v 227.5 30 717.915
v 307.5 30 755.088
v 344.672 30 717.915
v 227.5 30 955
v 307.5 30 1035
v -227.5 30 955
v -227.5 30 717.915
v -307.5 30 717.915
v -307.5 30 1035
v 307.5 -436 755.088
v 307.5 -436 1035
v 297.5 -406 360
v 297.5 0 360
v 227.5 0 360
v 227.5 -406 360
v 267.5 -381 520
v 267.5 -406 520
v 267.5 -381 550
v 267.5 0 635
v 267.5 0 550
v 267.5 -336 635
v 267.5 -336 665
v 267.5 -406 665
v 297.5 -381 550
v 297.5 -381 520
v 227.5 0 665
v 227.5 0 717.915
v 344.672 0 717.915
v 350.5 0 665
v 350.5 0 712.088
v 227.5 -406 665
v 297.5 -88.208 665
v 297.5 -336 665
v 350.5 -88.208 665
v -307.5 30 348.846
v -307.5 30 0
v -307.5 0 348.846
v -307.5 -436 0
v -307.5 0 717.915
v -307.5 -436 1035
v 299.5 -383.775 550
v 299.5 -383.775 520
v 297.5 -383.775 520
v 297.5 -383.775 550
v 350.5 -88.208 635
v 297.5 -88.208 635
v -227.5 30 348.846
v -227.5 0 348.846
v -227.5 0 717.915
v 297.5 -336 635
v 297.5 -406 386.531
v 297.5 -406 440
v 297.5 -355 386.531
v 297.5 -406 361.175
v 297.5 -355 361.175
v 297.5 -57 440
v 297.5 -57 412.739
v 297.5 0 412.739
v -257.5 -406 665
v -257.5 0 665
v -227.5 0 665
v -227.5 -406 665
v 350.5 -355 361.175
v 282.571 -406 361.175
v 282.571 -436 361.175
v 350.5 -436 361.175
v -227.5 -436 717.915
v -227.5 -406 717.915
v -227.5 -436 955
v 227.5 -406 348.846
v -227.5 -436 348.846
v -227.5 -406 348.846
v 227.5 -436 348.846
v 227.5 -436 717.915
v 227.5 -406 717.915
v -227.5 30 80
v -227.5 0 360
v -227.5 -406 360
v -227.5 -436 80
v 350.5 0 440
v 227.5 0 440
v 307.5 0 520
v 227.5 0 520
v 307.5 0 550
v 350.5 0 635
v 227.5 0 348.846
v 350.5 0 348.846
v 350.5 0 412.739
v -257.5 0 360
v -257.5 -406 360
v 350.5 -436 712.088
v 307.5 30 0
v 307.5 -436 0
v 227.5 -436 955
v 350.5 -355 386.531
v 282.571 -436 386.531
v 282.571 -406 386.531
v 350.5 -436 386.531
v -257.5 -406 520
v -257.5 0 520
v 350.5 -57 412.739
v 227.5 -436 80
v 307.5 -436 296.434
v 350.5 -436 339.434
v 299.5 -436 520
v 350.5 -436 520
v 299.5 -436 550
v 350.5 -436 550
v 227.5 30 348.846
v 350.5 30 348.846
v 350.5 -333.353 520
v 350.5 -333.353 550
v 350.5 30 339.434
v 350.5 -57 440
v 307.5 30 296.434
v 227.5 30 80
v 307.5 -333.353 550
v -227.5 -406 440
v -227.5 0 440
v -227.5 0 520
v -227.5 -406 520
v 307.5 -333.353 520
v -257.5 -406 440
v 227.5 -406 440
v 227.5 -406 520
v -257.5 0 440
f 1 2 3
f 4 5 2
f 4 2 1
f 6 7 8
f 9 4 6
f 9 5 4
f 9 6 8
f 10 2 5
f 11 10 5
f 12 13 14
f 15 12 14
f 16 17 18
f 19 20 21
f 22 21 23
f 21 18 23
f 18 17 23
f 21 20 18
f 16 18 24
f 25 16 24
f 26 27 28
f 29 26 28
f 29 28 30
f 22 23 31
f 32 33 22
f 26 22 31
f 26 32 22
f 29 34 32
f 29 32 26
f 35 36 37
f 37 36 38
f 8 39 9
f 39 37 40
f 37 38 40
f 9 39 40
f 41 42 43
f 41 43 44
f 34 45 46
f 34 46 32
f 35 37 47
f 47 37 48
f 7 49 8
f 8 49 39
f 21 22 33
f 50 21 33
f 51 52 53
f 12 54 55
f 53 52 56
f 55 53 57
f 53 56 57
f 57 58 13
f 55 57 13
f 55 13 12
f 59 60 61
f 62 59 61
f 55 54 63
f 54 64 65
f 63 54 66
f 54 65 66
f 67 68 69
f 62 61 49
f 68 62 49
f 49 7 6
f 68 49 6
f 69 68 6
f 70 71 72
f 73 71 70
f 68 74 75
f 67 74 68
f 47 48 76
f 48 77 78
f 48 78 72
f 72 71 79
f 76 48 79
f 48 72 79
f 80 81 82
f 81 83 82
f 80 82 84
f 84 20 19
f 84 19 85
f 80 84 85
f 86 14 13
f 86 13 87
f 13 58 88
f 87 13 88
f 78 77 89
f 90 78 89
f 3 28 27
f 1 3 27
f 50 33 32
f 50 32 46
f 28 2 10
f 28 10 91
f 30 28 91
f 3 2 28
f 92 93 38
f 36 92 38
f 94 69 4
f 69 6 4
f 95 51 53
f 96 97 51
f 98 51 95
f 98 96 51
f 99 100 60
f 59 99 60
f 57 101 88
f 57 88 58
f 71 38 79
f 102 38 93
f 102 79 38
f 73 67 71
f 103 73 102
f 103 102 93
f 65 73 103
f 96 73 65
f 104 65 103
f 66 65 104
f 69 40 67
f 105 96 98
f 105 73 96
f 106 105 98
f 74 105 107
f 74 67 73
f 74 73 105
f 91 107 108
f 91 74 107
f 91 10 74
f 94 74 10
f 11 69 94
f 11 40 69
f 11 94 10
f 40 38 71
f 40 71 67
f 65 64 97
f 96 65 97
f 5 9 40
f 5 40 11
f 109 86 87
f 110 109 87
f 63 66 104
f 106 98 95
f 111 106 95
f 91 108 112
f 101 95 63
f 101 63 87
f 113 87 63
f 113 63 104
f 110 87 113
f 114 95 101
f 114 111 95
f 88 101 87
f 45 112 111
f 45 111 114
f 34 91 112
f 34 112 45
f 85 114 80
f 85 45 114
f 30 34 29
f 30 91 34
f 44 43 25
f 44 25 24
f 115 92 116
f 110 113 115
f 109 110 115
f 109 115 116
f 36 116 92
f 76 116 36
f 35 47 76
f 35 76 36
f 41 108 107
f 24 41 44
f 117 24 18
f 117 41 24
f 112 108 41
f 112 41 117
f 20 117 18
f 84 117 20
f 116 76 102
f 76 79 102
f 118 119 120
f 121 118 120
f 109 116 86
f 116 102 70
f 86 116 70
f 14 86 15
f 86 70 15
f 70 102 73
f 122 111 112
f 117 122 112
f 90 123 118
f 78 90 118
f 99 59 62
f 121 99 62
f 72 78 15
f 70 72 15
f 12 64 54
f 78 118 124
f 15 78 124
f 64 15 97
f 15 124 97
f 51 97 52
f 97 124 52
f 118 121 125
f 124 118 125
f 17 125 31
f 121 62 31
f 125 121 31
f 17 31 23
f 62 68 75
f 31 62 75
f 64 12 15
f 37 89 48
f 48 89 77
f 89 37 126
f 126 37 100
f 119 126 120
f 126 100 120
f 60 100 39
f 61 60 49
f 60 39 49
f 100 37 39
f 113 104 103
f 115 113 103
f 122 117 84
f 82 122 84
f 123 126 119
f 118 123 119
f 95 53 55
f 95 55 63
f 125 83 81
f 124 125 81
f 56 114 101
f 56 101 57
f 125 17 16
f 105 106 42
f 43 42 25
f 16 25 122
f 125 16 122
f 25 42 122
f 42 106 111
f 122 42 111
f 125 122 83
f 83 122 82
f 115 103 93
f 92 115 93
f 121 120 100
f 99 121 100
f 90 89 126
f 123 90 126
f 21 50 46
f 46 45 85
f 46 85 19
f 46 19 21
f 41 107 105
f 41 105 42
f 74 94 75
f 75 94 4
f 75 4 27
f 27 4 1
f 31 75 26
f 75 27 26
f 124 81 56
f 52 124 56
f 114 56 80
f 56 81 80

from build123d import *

# Parameters (mm, degrees)
F0_W        = 615
F0_H        = 1035
F1_DEPTH    = 436
F2_W        = 383.7750256062
F2_H        = 30
F2_W_2      = 88.2078781724
F3_DEPTH    = 10
F4_W        = 436
F4_H        = 368.6535954475
F5_DEPTH    = 43
F6_T4_DEPTH = 436
F6_T9_DEPTH = 436
F7_W        = 102.6465103626
F7_H        = 30
F7_W_2      = 88.2078781724
F8_DEPTH    = 51
F9_W        = 30
F9_H        = 30
F10_DEPTH   = 55
F11_W       = 30
F11_H       = 30
F12_DEPTH   = 100
F14_DEPTH   = 30
F15_W       = 53
F15_H       = 27.2612595558
F16_DEPTH   = 57
F17_W       = 67.928535223
F17_H       = 25.3568291664
F18_DEPTH   = 81
F20_DEPTH   = 30
F22_DEPTH   = 25


# Not quite as in the source:
# - a fillet or chamfer that OpenCascade refuses, or shapes differently, is made with other operations: its cross-section is extruded or revolved along the edge and cut away or added


with BuildPart() as f1:
    # F0 (on Front) → F1 (new body)
    with BuildSketch(Plane.XZ):
        with Locations((0, 517.5)):
            Rectangle(F0_W, F0_H)
        Polygon((227.5, 80), (-227.5, 80), (-227.5, 360), (-257.5, 360), (-257.5, 440), (-227.5, 440), (-227.5, 520), (-257.5, 520), (-257.5, 665), (-227.5, 665), (-227.5, 955), (227.5, 955), (227.5, 665), (267.5, 665), (297.5, 665), (297.5, 635), (267.5, 635), (267.5, 550), (297.5, 550), (297.5, 520), (267.5, 520), (227.5, 520), (227.5, 440), (297.5, 440), (297.5, 360), (227.5, 360), align=None, mode=Mode.SUBTRACT)
    extrude(amount=F1_DEPTH)

    # F2 (on face) → F3 (cut, through all)
    with BuildSketch(Plane.YZ.offset(307.5)):
        with Locations((-191.8875128031, 535)):
            Rectangle(F2_W, F2_H)
        with Locations((-44.1039390862, 650)):
            Rectangle(F2_W_2, F2_H)
    extrude(amount=-F3_DEPTH, mode=Mode.SUBTRACT)

    # F4 (on face) → F5 (join)
    with BuildSketch(Plane.YZ.offset(307.5)):
        with Locations((-218, 525.7607400417)):
            Rectangle(F4_W, F4_H)
    extrude(amount=F5_DEPTH)

    # F6: chamfer of 45 on 2 edges, made by hand


with BuildPart() as f6_tool2:
    # F6_s3 → F6_t4 (new body)
    with BuildSketch(Plane.XZ):
        Polygon((307.5, 755.0875377655), (352.5, 710.0875377655), (307.5, 710.0875377655), align=None)
    extrude(amount=F6_T4_DEPTH)

    split(bisect_by=Plane.YZ.offset(350.5), keep=Keep.BOTTOM)


with BuildPart() as f1_1:
    add(f1.part)

    # F6_t1: union F6_tool2
    add(f6_tool2.part)


with BuildPart() as f6_tool7:
    # F6_s8 → F6_t9 (new body)
    with BuildSketch(Plane.XZ.offset(436)):
        Polygon((307.5, 296.433942318), (352.5, 341.433942318), (307.5, 341.433942318), align=None)
    extrude(amount=-F6_T9_DEPTH)

    split(bisect_by=Plane.YZ.offset(350.5), keep=Keep.BOTTOM)


with BuildPart() as f1_2:
    add(f1_1.part)

    # F6_t6: union F6_tool7
    add(f6_tool7.part)

    # F7 (on face) → F8 (cut)
    with BuildSketch(Plane.YZ.offset(350.5)):
        with Locations((-384.6767448187, 535)):
            Rectangle(F7_W, F7_H)
        with Locations((-44.1039390862, 650)):
            Rectangle(F7_W_2, F7_H)
    extrude(amount=-F8_DEPTH, mode=Mode.SUBTRACT)

    # F9 (on face) → F10 (join)
    with BuildSketch(Plane.XZ.offset(436)):
        with Locations((282.5, 535)):
            Rectangle(F9_W, F9_H)
    extrude(amount=-F10_DEPTH)

    # F11 (on face) → F12 (join)
    with BuildSketch(Plane.XZ.offset(436)):
        with Locations((282.5, 650)):
            Rectangle(F11_W, F11_H)
    extrude(amount=-F12_DEPTH)

    # F13 (on face) → F14 (join)
    with BuildSketch(Plane.XZ.offset(436)):
        Polygon((227.5, 665), (227.5, 717.9152965546), (-227.5, 717.9152965546), (-227.5, 665), (-257.5, 665), (-257.5, 520), (-227.5, 520), (-227.5, 440), (-257.5, 440), (-257.5, 360), (-227.5, 360), (-227.5, 348.8455712795), (227.5, 348.8455712795), (227.5, 360), (297.5, 360), (297.5, 440), (227.5, 440), (227.5, 520), (267.5, 520), (267.5, 665), align=None)
    extrude(amount=-F14_DEPTH)

    # F15 (on face) → F16 (cut)
    with BuildSketch(Plane(origin=(0, 0, 0), x_dir=(-1, 0, 0), z_dir=(0, 1, 0))):
        with Locations((-324, 426.3693702221)):
            Rectangle(F15_W, F15_H)
    extrude(amount=-F16_DEPTH, mode=Mode.SUBTRACT)

    # F17 (on face) → F18 (cut)
    with BuildSketch(Plane.XZ.offset(436)):
        with Locations((316.5357323885, 373.8530278206)):
            Rectangle(F17_W, F17_H)
    extrude(amount=-F18_DEPTH, mode=Mode.SUBTRACT)

    # F19 (on face) → F20 (join)
    with BuildSketch(Plane(origin=(0, 0, 0), x_dir=(-1, 0, 0), z_dir=(0, 1, 0))):
        Polygon((307.5, 0), (307.5, 348.8455712795), (227.5, 348.8455712795), (227.5, 80), (-227.5, 80), (-227.5, 348.8455712795), (-350.5, 348.8455712795), (-350.5, 339.433942318), (-307.5, 296.433942318), (-307.5, 0), align=None)
        Polygon((-359.9116289616, 348.8455712795), (-350.5, 339.433942318), (-350.5, 348.8455712795), align=None)
        Polygon((-344.6722412109, 717.9152965546), (-227.5, 717.9152965546), (-227.5, 955), (227.5, 955), (227.5, 717.9152965546), (307.5, 717.9152965546), (307.5, 1035), (-307.5, 1035), (-307.5, 755.0875377655), align=None)
    extrude(amount=F20_DEPTH)

    # F21 (on face) → F22 (cut)
    with BuildSketch(Plane.YZ.offset(350.5)):
        Polygon((52.2877275944, 373.7032711506), (0, 373.7032711506), (0, 348.8455712795), (0, 339.433942318), (-23.2749842107, 339.433942318), (-23.2749842107, 317.8108334541), (52.2877275944, 317.8108334541), align=None)
    extrude(amount=F22_DEPTH, mode=Mode.SUBTRACT)


solid = f1_2.part
